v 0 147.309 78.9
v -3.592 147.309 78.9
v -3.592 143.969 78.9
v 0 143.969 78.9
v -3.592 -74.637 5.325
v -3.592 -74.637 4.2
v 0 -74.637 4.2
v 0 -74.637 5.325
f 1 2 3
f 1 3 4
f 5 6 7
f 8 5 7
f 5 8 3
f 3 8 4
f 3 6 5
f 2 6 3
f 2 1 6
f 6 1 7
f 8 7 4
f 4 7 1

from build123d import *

# Parameters (mm, degrees)
F0_W     = 2.3947283626
F0_H     = 149.2308974266
F1_DEPTH = 54
F3_DEPTH = 25
F4_SCALE = 1.5


with BuildPart() as f1:
    # F0 (on Top) → F1 (new body)
    with BuildSketch(Plane.XY):
        with Locations((-1.1973641813, -0.0216662884)):
            Rectangle(F0_W, F0_H)
    extrude(amount=F1_DEPTH)

    # F2 (on face) → F3 (cut)
    with BuildSketch(Plane.YZ):
        Polygon((-74.6371150017, 54), (-74.6371150017, 4.9500004388), (71.1000040174, 54), align=None)
        Polygon((73.3271613717, 54), (-74.6371150017, 4.2004174363), (-74.6371150017, 0), (74.5937824249, 0), (74.5937824249, 54), align=None)
    extrude(amount=-F3_DEPTH, mode=Mode.SUBTRACT)


with BuildPart() as f1_1:
    # F4: moved
    add(f1.part.scale(F4_SCALE).moved(Location((0, 37.3185575008, -2.1002087182))))


solid = f1_1.part
